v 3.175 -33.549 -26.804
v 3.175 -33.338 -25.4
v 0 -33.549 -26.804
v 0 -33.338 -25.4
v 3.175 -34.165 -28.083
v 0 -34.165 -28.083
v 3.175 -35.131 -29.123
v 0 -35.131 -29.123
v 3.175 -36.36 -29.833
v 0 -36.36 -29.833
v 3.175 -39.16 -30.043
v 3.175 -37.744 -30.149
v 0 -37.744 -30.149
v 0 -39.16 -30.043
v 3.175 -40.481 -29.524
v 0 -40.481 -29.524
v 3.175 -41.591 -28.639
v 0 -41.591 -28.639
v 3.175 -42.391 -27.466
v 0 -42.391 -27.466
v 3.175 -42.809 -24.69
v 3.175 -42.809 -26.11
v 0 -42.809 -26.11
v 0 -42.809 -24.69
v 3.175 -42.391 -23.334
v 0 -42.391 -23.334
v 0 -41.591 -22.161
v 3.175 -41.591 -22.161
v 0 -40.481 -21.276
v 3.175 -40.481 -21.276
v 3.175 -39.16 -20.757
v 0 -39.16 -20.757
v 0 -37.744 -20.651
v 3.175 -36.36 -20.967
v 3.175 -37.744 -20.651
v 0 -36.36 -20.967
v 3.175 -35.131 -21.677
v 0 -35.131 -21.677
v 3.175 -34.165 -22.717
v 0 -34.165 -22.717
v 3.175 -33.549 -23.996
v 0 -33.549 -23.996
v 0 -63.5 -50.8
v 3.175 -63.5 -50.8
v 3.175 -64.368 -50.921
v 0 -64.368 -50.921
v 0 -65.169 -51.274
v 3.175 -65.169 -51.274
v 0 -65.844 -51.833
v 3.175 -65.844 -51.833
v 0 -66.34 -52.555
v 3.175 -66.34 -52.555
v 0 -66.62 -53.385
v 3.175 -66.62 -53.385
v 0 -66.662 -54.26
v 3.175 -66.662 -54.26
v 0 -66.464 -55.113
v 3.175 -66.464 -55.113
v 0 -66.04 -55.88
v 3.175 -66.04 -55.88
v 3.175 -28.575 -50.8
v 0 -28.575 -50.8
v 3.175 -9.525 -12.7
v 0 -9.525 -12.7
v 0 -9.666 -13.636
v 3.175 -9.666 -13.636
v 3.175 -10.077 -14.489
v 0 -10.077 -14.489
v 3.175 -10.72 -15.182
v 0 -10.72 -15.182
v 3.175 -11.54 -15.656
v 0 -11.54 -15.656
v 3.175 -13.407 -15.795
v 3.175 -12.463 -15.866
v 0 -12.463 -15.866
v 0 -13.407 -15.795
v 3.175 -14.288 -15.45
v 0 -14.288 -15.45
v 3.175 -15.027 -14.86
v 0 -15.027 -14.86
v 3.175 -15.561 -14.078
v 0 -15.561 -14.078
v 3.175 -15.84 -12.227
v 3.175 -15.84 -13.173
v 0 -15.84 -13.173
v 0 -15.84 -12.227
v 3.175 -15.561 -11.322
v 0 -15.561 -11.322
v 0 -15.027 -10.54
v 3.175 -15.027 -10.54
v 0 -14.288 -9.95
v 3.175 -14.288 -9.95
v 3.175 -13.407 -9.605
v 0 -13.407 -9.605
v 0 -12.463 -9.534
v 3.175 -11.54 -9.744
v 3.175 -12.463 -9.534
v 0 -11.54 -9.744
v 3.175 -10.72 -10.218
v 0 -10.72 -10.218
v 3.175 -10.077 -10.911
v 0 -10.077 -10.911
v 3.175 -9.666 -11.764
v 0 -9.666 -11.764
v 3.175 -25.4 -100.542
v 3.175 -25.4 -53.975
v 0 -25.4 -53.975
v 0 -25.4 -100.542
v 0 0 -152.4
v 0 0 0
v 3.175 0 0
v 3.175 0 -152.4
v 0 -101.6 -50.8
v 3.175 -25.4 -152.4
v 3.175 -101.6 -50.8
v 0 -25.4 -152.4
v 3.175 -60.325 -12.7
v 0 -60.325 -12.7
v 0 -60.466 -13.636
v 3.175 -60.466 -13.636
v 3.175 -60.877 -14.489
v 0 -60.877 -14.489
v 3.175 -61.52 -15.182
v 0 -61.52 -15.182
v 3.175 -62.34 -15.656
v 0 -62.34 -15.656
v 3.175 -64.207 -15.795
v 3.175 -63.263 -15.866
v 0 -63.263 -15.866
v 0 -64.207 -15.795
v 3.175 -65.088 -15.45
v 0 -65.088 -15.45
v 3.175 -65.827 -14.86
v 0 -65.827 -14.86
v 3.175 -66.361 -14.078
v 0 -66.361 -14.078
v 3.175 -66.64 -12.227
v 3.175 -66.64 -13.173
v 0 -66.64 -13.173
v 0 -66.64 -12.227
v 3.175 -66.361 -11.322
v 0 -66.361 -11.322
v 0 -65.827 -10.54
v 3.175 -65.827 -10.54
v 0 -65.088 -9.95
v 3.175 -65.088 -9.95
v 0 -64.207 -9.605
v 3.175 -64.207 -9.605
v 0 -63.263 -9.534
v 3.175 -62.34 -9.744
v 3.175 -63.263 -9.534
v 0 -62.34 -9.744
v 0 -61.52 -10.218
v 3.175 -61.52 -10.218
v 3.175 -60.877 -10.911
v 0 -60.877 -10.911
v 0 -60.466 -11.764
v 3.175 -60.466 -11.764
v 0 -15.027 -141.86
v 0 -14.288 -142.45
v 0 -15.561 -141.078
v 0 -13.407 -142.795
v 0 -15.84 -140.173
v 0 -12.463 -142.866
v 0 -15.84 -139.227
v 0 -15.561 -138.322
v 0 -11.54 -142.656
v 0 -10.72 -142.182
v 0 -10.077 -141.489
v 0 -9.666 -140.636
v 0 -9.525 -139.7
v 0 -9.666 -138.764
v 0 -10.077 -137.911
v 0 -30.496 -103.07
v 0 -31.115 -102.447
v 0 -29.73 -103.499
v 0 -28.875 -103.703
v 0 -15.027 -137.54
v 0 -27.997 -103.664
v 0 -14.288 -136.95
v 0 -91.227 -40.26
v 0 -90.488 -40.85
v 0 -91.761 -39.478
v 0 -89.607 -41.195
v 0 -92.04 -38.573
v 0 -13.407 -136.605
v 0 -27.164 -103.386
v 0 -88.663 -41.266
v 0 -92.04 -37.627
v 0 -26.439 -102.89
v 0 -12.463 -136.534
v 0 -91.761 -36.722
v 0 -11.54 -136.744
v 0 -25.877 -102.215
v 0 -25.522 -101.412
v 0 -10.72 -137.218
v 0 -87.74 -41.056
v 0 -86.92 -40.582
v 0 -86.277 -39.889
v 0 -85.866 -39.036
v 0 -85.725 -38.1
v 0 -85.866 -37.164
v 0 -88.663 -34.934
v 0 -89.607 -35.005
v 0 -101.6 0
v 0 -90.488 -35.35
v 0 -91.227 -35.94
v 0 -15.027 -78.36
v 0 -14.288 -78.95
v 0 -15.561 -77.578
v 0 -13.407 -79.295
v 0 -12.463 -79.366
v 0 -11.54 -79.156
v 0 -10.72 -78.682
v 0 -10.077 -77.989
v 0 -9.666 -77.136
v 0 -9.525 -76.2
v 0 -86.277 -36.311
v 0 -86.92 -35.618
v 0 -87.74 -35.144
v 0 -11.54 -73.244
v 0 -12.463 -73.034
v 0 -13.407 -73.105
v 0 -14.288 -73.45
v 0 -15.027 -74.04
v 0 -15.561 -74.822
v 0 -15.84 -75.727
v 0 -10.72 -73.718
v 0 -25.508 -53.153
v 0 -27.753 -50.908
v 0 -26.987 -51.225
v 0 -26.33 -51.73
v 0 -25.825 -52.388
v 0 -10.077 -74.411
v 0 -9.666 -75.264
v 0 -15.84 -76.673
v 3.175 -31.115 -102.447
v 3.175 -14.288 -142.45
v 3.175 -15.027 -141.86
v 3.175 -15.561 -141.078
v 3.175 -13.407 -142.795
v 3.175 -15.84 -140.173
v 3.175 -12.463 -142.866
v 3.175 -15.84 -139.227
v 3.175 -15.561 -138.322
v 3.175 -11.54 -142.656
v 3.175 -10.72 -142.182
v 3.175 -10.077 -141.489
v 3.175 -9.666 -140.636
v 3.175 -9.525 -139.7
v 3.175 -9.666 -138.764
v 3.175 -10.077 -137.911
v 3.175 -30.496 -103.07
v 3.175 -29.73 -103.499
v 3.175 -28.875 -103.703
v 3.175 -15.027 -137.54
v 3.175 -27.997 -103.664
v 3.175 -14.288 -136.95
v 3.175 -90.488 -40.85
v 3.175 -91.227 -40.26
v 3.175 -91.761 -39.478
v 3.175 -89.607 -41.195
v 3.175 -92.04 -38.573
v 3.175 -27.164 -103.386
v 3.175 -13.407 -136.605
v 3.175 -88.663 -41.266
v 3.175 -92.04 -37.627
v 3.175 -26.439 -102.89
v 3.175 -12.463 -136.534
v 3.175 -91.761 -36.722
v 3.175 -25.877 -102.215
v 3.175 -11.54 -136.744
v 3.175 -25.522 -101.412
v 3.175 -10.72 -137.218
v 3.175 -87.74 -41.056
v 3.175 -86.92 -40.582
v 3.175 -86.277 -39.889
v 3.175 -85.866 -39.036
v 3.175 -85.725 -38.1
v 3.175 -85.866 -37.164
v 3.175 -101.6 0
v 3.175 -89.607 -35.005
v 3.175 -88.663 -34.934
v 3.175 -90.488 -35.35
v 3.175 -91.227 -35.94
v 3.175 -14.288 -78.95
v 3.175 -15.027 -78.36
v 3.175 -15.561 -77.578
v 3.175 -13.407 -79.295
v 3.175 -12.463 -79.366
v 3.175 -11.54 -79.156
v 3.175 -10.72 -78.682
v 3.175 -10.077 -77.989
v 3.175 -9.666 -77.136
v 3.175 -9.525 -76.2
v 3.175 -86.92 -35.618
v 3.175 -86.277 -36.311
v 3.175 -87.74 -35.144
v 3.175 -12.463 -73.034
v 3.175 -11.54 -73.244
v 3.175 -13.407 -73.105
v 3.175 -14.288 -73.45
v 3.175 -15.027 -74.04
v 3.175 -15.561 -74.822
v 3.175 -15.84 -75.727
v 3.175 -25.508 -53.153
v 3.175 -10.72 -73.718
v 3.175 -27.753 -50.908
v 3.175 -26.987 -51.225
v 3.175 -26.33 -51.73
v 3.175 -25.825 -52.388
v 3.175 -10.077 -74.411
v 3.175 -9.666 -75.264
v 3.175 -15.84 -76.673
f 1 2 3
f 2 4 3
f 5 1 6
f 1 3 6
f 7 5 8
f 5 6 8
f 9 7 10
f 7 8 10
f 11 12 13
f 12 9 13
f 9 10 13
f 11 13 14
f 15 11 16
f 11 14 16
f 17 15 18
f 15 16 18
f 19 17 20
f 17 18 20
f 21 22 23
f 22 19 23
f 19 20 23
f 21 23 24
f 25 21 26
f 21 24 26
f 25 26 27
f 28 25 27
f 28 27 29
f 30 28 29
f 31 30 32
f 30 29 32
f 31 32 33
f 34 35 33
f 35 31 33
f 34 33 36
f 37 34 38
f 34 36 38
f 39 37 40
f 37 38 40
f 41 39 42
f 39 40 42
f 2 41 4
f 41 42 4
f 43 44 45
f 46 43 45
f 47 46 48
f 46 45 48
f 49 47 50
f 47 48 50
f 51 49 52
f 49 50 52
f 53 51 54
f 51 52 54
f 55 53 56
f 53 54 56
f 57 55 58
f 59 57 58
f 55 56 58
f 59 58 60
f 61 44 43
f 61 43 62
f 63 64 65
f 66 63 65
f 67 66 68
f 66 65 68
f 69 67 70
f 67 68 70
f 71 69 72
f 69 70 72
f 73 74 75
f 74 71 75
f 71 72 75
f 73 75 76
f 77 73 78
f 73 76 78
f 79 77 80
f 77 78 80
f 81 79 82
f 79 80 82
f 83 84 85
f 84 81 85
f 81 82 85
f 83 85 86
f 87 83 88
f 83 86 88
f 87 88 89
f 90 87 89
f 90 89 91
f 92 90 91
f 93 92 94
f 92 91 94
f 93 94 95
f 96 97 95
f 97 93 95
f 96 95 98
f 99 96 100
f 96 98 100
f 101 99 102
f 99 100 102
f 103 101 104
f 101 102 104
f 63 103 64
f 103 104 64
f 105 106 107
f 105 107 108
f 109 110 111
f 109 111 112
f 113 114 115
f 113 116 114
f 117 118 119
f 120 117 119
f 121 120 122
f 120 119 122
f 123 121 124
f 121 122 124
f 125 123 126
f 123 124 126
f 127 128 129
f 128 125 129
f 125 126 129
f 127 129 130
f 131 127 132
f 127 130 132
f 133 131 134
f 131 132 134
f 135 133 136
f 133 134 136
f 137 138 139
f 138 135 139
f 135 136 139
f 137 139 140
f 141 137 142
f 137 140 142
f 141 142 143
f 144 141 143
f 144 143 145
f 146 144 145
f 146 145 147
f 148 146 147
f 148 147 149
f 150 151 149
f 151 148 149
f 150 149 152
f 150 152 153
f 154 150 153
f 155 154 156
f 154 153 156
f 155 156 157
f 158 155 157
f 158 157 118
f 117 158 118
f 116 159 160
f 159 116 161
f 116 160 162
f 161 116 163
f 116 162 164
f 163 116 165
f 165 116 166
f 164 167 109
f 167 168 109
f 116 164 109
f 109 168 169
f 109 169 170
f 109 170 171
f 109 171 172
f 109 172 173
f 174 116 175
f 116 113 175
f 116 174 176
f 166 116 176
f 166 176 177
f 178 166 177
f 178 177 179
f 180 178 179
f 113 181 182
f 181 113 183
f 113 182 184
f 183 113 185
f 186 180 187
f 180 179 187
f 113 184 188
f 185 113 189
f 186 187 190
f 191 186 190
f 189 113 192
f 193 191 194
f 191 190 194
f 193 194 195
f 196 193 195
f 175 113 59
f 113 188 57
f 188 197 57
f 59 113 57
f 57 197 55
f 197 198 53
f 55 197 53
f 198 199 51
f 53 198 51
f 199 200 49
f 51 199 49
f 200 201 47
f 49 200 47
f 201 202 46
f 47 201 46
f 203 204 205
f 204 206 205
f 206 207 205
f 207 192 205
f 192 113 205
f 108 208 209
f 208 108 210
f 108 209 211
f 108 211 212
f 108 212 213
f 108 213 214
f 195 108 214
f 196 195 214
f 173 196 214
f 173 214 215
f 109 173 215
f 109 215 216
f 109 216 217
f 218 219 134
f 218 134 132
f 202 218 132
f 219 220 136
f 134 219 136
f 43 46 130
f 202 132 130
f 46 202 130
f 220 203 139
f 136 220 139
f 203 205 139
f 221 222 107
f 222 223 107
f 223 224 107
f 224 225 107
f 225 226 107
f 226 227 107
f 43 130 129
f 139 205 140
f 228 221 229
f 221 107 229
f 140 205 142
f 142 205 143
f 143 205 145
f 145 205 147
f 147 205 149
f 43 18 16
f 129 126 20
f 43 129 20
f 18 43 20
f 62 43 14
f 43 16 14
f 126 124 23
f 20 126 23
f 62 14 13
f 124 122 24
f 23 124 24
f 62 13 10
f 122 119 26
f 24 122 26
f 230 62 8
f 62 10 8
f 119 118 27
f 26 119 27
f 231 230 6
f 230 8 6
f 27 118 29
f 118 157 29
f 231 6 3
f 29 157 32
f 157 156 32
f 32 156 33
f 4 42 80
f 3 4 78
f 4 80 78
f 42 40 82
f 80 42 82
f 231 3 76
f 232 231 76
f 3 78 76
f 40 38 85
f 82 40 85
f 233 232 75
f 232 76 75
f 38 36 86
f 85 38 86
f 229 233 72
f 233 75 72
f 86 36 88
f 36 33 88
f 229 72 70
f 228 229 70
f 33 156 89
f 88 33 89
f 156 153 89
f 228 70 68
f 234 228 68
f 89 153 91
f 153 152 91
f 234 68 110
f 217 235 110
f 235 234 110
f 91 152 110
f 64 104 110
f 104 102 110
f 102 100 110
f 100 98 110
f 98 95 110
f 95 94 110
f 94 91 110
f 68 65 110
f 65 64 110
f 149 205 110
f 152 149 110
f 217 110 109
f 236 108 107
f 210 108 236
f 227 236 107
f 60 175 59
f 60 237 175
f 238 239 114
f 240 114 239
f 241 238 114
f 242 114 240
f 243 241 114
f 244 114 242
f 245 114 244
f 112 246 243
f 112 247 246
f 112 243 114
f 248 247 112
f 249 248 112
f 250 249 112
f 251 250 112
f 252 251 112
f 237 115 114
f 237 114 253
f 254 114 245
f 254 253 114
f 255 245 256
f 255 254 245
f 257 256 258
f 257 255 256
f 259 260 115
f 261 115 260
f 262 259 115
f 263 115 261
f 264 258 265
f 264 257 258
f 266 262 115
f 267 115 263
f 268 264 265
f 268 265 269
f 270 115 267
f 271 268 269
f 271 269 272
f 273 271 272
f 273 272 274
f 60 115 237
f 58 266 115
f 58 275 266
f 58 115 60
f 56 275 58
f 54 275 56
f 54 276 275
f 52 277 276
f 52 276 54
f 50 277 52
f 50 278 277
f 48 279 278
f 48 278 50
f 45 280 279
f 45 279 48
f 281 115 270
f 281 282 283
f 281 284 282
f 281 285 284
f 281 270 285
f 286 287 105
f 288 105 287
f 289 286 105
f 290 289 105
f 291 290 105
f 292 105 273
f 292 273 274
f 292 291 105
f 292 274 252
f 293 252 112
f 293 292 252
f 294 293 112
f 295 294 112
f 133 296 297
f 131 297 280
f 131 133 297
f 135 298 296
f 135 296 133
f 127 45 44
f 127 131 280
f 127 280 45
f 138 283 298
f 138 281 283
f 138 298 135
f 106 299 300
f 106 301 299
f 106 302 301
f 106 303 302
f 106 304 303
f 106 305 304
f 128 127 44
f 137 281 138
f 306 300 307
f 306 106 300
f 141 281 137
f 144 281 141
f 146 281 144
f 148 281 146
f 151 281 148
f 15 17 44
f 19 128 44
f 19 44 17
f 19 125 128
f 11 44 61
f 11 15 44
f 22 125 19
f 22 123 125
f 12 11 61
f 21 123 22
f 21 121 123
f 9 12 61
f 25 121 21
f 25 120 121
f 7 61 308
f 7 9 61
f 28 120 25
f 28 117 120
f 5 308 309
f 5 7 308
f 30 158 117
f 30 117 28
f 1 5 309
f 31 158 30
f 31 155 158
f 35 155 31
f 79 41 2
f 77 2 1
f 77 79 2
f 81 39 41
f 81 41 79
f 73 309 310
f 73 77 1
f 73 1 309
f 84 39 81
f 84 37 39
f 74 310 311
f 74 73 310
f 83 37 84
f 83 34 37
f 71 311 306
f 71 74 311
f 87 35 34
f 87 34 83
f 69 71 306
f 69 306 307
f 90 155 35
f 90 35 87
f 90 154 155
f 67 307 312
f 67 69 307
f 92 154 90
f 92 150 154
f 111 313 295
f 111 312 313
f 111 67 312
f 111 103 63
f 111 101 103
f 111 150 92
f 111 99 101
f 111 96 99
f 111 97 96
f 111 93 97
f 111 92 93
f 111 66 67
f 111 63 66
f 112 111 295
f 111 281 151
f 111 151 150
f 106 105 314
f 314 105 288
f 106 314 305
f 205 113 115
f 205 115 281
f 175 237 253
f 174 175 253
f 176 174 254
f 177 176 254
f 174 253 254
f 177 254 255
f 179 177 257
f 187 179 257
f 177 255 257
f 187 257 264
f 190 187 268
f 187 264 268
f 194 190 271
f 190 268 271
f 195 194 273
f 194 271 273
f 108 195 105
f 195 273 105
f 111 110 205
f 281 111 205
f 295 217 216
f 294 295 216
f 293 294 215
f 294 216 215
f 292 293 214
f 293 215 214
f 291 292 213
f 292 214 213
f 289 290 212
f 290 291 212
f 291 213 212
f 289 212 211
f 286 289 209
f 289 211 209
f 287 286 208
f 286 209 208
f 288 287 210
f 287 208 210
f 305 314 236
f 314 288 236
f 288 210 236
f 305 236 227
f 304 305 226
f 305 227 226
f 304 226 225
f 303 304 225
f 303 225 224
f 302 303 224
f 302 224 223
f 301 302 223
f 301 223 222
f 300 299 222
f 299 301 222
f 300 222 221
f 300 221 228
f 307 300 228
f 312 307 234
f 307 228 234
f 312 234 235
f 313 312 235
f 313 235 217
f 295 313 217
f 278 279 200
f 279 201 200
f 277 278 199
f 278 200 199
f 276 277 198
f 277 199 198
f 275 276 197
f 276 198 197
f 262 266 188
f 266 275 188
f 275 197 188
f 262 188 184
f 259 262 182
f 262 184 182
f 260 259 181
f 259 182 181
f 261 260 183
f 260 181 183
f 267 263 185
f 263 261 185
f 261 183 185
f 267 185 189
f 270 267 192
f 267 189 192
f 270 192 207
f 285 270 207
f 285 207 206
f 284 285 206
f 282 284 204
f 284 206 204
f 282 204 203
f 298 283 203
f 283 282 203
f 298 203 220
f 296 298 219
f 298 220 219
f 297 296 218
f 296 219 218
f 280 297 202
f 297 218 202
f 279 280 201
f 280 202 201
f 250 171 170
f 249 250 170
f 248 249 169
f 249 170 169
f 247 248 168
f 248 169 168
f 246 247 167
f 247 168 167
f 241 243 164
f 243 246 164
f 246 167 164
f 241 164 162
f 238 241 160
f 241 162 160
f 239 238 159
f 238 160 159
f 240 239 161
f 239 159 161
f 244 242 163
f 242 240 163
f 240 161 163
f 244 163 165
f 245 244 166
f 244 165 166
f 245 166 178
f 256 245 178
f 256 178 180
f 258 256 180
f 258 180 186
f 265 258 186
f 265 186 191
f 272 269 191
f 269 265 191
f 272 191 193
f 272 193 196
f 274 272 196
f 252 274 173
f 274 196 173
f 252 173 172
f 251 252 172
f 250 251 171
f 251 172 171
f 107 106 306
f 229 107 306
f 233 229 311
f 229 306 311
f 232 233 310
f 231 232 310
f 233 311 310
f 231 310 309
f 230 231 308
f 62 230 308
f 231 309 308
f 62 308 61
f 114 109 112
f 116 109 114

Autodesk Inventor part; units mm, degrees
ref_plane "YZ Plane" through (0, 0, 0) normal (1, 0, 0) x (0, 1, 0)
ref_plane "XZ Plane" through (0, 0, 0) normal (0, 1, 0) x (-1, 0, 0)
ref_plane "XY Plane" through (0, 0, 0) normal (0, 0, 1) x (1, 0, 0)
sketch "Sketch1" plane through (0, 0, 0) normal (1, 0, 0) x (0, 1, 0)
  line L0 (0, 0) -> (0, -152.4)
  line L1 (0, -152.4) -> (-25.4, -152.4)
  line L2 (-25.4, -152.4) -> (-101.6, -50.8)
  line L3 (-101.6, -50.8) -> (-101.6, 0)
  circle A0 centre (-63.5, -12.7) radius 3.175
  circle A1 centre (-12.7, -12.7) radius 3.175
  circle A2 centre (-12.7, -76.2) radius 3.175
  circle A3 centre (-12.7, -139.7) radius 3.175
  line L4 (-12.7, 0) -> (-12.7, -152.4) construction
  line L5 (0, -12.7) -> (-101.6, -12.7) construction
  circle A4 centre (-88.9, -38.1) radius 3.175
  circle A5 centre (-38.1, -25.4) radius 4.7625
  line L6 (0, 0) -> (-101.6, 0)
  dimension "d0" = 50.8
  dimension "d1" = 25.4
  dimension "d2" = 101.6
  dimension "d3" = 152.4
  dimension "d4" = 63.5
  dimension "d5" = 63.5
  dimension "d6" = 12.7
  dimension "d8" = 50.8
  dimension "d10" = 12.7
  dimension "d11" = 12.7
  dimension "d13" = 9.525
  dimension "d15" = 6.35
  dimension "d24" = 90
  dimension "d25" = 12.7
  dimension "d26" = 25.4
  dimension "d27" = 152.4
  dimension "d29" = 63.5
extrude "Extrusion1" add sketch "Sketch1" along normal blind 3.175
sketch "Sketch2" plane through (3.175, 0, 0) normal (1, 0, 0) x (0, 0, -1)
  line L0 (50.8, -63.5) -> (50.8, -28.575)
  line L1 (53.975, -25.4) -> (100.5417, -25.4)
  line L2 (102.4467, -31.115) -> (55.88, -66.04)
  line L3 (152.4, 0) -> (0, 0) projected
  line L4 (0, 0) -> (0, -101.6) projected
  line L5 (50.8, -101.6) -> (152.4, -25.4) projected
  arc A0 (50.8, -63.5) -> (55.88, -66.04) centre (53.975, -63.5) ccw
  arc A1 (53.975, -25.4) -> (50.8, -28.575) centre (53.975, -28.575) ccw
  arc A2 (102.4467, -31.115) -> (100.5417, -25.4) centre (100.5417, -28.575) ccw
  line L6 (0, 0) -> (0, -101.6) projected
  dimension "d18" = 25.4
  dimension "d19" = 25.4
  dimension "d21" = 3.175
  dimension "d28" = 50.8
extrude "Extrusion2" cut sketch "Sketch2" against normal blind 3.175
properties part number "15102898-16-P-0205" material "Aluminum 6061"
